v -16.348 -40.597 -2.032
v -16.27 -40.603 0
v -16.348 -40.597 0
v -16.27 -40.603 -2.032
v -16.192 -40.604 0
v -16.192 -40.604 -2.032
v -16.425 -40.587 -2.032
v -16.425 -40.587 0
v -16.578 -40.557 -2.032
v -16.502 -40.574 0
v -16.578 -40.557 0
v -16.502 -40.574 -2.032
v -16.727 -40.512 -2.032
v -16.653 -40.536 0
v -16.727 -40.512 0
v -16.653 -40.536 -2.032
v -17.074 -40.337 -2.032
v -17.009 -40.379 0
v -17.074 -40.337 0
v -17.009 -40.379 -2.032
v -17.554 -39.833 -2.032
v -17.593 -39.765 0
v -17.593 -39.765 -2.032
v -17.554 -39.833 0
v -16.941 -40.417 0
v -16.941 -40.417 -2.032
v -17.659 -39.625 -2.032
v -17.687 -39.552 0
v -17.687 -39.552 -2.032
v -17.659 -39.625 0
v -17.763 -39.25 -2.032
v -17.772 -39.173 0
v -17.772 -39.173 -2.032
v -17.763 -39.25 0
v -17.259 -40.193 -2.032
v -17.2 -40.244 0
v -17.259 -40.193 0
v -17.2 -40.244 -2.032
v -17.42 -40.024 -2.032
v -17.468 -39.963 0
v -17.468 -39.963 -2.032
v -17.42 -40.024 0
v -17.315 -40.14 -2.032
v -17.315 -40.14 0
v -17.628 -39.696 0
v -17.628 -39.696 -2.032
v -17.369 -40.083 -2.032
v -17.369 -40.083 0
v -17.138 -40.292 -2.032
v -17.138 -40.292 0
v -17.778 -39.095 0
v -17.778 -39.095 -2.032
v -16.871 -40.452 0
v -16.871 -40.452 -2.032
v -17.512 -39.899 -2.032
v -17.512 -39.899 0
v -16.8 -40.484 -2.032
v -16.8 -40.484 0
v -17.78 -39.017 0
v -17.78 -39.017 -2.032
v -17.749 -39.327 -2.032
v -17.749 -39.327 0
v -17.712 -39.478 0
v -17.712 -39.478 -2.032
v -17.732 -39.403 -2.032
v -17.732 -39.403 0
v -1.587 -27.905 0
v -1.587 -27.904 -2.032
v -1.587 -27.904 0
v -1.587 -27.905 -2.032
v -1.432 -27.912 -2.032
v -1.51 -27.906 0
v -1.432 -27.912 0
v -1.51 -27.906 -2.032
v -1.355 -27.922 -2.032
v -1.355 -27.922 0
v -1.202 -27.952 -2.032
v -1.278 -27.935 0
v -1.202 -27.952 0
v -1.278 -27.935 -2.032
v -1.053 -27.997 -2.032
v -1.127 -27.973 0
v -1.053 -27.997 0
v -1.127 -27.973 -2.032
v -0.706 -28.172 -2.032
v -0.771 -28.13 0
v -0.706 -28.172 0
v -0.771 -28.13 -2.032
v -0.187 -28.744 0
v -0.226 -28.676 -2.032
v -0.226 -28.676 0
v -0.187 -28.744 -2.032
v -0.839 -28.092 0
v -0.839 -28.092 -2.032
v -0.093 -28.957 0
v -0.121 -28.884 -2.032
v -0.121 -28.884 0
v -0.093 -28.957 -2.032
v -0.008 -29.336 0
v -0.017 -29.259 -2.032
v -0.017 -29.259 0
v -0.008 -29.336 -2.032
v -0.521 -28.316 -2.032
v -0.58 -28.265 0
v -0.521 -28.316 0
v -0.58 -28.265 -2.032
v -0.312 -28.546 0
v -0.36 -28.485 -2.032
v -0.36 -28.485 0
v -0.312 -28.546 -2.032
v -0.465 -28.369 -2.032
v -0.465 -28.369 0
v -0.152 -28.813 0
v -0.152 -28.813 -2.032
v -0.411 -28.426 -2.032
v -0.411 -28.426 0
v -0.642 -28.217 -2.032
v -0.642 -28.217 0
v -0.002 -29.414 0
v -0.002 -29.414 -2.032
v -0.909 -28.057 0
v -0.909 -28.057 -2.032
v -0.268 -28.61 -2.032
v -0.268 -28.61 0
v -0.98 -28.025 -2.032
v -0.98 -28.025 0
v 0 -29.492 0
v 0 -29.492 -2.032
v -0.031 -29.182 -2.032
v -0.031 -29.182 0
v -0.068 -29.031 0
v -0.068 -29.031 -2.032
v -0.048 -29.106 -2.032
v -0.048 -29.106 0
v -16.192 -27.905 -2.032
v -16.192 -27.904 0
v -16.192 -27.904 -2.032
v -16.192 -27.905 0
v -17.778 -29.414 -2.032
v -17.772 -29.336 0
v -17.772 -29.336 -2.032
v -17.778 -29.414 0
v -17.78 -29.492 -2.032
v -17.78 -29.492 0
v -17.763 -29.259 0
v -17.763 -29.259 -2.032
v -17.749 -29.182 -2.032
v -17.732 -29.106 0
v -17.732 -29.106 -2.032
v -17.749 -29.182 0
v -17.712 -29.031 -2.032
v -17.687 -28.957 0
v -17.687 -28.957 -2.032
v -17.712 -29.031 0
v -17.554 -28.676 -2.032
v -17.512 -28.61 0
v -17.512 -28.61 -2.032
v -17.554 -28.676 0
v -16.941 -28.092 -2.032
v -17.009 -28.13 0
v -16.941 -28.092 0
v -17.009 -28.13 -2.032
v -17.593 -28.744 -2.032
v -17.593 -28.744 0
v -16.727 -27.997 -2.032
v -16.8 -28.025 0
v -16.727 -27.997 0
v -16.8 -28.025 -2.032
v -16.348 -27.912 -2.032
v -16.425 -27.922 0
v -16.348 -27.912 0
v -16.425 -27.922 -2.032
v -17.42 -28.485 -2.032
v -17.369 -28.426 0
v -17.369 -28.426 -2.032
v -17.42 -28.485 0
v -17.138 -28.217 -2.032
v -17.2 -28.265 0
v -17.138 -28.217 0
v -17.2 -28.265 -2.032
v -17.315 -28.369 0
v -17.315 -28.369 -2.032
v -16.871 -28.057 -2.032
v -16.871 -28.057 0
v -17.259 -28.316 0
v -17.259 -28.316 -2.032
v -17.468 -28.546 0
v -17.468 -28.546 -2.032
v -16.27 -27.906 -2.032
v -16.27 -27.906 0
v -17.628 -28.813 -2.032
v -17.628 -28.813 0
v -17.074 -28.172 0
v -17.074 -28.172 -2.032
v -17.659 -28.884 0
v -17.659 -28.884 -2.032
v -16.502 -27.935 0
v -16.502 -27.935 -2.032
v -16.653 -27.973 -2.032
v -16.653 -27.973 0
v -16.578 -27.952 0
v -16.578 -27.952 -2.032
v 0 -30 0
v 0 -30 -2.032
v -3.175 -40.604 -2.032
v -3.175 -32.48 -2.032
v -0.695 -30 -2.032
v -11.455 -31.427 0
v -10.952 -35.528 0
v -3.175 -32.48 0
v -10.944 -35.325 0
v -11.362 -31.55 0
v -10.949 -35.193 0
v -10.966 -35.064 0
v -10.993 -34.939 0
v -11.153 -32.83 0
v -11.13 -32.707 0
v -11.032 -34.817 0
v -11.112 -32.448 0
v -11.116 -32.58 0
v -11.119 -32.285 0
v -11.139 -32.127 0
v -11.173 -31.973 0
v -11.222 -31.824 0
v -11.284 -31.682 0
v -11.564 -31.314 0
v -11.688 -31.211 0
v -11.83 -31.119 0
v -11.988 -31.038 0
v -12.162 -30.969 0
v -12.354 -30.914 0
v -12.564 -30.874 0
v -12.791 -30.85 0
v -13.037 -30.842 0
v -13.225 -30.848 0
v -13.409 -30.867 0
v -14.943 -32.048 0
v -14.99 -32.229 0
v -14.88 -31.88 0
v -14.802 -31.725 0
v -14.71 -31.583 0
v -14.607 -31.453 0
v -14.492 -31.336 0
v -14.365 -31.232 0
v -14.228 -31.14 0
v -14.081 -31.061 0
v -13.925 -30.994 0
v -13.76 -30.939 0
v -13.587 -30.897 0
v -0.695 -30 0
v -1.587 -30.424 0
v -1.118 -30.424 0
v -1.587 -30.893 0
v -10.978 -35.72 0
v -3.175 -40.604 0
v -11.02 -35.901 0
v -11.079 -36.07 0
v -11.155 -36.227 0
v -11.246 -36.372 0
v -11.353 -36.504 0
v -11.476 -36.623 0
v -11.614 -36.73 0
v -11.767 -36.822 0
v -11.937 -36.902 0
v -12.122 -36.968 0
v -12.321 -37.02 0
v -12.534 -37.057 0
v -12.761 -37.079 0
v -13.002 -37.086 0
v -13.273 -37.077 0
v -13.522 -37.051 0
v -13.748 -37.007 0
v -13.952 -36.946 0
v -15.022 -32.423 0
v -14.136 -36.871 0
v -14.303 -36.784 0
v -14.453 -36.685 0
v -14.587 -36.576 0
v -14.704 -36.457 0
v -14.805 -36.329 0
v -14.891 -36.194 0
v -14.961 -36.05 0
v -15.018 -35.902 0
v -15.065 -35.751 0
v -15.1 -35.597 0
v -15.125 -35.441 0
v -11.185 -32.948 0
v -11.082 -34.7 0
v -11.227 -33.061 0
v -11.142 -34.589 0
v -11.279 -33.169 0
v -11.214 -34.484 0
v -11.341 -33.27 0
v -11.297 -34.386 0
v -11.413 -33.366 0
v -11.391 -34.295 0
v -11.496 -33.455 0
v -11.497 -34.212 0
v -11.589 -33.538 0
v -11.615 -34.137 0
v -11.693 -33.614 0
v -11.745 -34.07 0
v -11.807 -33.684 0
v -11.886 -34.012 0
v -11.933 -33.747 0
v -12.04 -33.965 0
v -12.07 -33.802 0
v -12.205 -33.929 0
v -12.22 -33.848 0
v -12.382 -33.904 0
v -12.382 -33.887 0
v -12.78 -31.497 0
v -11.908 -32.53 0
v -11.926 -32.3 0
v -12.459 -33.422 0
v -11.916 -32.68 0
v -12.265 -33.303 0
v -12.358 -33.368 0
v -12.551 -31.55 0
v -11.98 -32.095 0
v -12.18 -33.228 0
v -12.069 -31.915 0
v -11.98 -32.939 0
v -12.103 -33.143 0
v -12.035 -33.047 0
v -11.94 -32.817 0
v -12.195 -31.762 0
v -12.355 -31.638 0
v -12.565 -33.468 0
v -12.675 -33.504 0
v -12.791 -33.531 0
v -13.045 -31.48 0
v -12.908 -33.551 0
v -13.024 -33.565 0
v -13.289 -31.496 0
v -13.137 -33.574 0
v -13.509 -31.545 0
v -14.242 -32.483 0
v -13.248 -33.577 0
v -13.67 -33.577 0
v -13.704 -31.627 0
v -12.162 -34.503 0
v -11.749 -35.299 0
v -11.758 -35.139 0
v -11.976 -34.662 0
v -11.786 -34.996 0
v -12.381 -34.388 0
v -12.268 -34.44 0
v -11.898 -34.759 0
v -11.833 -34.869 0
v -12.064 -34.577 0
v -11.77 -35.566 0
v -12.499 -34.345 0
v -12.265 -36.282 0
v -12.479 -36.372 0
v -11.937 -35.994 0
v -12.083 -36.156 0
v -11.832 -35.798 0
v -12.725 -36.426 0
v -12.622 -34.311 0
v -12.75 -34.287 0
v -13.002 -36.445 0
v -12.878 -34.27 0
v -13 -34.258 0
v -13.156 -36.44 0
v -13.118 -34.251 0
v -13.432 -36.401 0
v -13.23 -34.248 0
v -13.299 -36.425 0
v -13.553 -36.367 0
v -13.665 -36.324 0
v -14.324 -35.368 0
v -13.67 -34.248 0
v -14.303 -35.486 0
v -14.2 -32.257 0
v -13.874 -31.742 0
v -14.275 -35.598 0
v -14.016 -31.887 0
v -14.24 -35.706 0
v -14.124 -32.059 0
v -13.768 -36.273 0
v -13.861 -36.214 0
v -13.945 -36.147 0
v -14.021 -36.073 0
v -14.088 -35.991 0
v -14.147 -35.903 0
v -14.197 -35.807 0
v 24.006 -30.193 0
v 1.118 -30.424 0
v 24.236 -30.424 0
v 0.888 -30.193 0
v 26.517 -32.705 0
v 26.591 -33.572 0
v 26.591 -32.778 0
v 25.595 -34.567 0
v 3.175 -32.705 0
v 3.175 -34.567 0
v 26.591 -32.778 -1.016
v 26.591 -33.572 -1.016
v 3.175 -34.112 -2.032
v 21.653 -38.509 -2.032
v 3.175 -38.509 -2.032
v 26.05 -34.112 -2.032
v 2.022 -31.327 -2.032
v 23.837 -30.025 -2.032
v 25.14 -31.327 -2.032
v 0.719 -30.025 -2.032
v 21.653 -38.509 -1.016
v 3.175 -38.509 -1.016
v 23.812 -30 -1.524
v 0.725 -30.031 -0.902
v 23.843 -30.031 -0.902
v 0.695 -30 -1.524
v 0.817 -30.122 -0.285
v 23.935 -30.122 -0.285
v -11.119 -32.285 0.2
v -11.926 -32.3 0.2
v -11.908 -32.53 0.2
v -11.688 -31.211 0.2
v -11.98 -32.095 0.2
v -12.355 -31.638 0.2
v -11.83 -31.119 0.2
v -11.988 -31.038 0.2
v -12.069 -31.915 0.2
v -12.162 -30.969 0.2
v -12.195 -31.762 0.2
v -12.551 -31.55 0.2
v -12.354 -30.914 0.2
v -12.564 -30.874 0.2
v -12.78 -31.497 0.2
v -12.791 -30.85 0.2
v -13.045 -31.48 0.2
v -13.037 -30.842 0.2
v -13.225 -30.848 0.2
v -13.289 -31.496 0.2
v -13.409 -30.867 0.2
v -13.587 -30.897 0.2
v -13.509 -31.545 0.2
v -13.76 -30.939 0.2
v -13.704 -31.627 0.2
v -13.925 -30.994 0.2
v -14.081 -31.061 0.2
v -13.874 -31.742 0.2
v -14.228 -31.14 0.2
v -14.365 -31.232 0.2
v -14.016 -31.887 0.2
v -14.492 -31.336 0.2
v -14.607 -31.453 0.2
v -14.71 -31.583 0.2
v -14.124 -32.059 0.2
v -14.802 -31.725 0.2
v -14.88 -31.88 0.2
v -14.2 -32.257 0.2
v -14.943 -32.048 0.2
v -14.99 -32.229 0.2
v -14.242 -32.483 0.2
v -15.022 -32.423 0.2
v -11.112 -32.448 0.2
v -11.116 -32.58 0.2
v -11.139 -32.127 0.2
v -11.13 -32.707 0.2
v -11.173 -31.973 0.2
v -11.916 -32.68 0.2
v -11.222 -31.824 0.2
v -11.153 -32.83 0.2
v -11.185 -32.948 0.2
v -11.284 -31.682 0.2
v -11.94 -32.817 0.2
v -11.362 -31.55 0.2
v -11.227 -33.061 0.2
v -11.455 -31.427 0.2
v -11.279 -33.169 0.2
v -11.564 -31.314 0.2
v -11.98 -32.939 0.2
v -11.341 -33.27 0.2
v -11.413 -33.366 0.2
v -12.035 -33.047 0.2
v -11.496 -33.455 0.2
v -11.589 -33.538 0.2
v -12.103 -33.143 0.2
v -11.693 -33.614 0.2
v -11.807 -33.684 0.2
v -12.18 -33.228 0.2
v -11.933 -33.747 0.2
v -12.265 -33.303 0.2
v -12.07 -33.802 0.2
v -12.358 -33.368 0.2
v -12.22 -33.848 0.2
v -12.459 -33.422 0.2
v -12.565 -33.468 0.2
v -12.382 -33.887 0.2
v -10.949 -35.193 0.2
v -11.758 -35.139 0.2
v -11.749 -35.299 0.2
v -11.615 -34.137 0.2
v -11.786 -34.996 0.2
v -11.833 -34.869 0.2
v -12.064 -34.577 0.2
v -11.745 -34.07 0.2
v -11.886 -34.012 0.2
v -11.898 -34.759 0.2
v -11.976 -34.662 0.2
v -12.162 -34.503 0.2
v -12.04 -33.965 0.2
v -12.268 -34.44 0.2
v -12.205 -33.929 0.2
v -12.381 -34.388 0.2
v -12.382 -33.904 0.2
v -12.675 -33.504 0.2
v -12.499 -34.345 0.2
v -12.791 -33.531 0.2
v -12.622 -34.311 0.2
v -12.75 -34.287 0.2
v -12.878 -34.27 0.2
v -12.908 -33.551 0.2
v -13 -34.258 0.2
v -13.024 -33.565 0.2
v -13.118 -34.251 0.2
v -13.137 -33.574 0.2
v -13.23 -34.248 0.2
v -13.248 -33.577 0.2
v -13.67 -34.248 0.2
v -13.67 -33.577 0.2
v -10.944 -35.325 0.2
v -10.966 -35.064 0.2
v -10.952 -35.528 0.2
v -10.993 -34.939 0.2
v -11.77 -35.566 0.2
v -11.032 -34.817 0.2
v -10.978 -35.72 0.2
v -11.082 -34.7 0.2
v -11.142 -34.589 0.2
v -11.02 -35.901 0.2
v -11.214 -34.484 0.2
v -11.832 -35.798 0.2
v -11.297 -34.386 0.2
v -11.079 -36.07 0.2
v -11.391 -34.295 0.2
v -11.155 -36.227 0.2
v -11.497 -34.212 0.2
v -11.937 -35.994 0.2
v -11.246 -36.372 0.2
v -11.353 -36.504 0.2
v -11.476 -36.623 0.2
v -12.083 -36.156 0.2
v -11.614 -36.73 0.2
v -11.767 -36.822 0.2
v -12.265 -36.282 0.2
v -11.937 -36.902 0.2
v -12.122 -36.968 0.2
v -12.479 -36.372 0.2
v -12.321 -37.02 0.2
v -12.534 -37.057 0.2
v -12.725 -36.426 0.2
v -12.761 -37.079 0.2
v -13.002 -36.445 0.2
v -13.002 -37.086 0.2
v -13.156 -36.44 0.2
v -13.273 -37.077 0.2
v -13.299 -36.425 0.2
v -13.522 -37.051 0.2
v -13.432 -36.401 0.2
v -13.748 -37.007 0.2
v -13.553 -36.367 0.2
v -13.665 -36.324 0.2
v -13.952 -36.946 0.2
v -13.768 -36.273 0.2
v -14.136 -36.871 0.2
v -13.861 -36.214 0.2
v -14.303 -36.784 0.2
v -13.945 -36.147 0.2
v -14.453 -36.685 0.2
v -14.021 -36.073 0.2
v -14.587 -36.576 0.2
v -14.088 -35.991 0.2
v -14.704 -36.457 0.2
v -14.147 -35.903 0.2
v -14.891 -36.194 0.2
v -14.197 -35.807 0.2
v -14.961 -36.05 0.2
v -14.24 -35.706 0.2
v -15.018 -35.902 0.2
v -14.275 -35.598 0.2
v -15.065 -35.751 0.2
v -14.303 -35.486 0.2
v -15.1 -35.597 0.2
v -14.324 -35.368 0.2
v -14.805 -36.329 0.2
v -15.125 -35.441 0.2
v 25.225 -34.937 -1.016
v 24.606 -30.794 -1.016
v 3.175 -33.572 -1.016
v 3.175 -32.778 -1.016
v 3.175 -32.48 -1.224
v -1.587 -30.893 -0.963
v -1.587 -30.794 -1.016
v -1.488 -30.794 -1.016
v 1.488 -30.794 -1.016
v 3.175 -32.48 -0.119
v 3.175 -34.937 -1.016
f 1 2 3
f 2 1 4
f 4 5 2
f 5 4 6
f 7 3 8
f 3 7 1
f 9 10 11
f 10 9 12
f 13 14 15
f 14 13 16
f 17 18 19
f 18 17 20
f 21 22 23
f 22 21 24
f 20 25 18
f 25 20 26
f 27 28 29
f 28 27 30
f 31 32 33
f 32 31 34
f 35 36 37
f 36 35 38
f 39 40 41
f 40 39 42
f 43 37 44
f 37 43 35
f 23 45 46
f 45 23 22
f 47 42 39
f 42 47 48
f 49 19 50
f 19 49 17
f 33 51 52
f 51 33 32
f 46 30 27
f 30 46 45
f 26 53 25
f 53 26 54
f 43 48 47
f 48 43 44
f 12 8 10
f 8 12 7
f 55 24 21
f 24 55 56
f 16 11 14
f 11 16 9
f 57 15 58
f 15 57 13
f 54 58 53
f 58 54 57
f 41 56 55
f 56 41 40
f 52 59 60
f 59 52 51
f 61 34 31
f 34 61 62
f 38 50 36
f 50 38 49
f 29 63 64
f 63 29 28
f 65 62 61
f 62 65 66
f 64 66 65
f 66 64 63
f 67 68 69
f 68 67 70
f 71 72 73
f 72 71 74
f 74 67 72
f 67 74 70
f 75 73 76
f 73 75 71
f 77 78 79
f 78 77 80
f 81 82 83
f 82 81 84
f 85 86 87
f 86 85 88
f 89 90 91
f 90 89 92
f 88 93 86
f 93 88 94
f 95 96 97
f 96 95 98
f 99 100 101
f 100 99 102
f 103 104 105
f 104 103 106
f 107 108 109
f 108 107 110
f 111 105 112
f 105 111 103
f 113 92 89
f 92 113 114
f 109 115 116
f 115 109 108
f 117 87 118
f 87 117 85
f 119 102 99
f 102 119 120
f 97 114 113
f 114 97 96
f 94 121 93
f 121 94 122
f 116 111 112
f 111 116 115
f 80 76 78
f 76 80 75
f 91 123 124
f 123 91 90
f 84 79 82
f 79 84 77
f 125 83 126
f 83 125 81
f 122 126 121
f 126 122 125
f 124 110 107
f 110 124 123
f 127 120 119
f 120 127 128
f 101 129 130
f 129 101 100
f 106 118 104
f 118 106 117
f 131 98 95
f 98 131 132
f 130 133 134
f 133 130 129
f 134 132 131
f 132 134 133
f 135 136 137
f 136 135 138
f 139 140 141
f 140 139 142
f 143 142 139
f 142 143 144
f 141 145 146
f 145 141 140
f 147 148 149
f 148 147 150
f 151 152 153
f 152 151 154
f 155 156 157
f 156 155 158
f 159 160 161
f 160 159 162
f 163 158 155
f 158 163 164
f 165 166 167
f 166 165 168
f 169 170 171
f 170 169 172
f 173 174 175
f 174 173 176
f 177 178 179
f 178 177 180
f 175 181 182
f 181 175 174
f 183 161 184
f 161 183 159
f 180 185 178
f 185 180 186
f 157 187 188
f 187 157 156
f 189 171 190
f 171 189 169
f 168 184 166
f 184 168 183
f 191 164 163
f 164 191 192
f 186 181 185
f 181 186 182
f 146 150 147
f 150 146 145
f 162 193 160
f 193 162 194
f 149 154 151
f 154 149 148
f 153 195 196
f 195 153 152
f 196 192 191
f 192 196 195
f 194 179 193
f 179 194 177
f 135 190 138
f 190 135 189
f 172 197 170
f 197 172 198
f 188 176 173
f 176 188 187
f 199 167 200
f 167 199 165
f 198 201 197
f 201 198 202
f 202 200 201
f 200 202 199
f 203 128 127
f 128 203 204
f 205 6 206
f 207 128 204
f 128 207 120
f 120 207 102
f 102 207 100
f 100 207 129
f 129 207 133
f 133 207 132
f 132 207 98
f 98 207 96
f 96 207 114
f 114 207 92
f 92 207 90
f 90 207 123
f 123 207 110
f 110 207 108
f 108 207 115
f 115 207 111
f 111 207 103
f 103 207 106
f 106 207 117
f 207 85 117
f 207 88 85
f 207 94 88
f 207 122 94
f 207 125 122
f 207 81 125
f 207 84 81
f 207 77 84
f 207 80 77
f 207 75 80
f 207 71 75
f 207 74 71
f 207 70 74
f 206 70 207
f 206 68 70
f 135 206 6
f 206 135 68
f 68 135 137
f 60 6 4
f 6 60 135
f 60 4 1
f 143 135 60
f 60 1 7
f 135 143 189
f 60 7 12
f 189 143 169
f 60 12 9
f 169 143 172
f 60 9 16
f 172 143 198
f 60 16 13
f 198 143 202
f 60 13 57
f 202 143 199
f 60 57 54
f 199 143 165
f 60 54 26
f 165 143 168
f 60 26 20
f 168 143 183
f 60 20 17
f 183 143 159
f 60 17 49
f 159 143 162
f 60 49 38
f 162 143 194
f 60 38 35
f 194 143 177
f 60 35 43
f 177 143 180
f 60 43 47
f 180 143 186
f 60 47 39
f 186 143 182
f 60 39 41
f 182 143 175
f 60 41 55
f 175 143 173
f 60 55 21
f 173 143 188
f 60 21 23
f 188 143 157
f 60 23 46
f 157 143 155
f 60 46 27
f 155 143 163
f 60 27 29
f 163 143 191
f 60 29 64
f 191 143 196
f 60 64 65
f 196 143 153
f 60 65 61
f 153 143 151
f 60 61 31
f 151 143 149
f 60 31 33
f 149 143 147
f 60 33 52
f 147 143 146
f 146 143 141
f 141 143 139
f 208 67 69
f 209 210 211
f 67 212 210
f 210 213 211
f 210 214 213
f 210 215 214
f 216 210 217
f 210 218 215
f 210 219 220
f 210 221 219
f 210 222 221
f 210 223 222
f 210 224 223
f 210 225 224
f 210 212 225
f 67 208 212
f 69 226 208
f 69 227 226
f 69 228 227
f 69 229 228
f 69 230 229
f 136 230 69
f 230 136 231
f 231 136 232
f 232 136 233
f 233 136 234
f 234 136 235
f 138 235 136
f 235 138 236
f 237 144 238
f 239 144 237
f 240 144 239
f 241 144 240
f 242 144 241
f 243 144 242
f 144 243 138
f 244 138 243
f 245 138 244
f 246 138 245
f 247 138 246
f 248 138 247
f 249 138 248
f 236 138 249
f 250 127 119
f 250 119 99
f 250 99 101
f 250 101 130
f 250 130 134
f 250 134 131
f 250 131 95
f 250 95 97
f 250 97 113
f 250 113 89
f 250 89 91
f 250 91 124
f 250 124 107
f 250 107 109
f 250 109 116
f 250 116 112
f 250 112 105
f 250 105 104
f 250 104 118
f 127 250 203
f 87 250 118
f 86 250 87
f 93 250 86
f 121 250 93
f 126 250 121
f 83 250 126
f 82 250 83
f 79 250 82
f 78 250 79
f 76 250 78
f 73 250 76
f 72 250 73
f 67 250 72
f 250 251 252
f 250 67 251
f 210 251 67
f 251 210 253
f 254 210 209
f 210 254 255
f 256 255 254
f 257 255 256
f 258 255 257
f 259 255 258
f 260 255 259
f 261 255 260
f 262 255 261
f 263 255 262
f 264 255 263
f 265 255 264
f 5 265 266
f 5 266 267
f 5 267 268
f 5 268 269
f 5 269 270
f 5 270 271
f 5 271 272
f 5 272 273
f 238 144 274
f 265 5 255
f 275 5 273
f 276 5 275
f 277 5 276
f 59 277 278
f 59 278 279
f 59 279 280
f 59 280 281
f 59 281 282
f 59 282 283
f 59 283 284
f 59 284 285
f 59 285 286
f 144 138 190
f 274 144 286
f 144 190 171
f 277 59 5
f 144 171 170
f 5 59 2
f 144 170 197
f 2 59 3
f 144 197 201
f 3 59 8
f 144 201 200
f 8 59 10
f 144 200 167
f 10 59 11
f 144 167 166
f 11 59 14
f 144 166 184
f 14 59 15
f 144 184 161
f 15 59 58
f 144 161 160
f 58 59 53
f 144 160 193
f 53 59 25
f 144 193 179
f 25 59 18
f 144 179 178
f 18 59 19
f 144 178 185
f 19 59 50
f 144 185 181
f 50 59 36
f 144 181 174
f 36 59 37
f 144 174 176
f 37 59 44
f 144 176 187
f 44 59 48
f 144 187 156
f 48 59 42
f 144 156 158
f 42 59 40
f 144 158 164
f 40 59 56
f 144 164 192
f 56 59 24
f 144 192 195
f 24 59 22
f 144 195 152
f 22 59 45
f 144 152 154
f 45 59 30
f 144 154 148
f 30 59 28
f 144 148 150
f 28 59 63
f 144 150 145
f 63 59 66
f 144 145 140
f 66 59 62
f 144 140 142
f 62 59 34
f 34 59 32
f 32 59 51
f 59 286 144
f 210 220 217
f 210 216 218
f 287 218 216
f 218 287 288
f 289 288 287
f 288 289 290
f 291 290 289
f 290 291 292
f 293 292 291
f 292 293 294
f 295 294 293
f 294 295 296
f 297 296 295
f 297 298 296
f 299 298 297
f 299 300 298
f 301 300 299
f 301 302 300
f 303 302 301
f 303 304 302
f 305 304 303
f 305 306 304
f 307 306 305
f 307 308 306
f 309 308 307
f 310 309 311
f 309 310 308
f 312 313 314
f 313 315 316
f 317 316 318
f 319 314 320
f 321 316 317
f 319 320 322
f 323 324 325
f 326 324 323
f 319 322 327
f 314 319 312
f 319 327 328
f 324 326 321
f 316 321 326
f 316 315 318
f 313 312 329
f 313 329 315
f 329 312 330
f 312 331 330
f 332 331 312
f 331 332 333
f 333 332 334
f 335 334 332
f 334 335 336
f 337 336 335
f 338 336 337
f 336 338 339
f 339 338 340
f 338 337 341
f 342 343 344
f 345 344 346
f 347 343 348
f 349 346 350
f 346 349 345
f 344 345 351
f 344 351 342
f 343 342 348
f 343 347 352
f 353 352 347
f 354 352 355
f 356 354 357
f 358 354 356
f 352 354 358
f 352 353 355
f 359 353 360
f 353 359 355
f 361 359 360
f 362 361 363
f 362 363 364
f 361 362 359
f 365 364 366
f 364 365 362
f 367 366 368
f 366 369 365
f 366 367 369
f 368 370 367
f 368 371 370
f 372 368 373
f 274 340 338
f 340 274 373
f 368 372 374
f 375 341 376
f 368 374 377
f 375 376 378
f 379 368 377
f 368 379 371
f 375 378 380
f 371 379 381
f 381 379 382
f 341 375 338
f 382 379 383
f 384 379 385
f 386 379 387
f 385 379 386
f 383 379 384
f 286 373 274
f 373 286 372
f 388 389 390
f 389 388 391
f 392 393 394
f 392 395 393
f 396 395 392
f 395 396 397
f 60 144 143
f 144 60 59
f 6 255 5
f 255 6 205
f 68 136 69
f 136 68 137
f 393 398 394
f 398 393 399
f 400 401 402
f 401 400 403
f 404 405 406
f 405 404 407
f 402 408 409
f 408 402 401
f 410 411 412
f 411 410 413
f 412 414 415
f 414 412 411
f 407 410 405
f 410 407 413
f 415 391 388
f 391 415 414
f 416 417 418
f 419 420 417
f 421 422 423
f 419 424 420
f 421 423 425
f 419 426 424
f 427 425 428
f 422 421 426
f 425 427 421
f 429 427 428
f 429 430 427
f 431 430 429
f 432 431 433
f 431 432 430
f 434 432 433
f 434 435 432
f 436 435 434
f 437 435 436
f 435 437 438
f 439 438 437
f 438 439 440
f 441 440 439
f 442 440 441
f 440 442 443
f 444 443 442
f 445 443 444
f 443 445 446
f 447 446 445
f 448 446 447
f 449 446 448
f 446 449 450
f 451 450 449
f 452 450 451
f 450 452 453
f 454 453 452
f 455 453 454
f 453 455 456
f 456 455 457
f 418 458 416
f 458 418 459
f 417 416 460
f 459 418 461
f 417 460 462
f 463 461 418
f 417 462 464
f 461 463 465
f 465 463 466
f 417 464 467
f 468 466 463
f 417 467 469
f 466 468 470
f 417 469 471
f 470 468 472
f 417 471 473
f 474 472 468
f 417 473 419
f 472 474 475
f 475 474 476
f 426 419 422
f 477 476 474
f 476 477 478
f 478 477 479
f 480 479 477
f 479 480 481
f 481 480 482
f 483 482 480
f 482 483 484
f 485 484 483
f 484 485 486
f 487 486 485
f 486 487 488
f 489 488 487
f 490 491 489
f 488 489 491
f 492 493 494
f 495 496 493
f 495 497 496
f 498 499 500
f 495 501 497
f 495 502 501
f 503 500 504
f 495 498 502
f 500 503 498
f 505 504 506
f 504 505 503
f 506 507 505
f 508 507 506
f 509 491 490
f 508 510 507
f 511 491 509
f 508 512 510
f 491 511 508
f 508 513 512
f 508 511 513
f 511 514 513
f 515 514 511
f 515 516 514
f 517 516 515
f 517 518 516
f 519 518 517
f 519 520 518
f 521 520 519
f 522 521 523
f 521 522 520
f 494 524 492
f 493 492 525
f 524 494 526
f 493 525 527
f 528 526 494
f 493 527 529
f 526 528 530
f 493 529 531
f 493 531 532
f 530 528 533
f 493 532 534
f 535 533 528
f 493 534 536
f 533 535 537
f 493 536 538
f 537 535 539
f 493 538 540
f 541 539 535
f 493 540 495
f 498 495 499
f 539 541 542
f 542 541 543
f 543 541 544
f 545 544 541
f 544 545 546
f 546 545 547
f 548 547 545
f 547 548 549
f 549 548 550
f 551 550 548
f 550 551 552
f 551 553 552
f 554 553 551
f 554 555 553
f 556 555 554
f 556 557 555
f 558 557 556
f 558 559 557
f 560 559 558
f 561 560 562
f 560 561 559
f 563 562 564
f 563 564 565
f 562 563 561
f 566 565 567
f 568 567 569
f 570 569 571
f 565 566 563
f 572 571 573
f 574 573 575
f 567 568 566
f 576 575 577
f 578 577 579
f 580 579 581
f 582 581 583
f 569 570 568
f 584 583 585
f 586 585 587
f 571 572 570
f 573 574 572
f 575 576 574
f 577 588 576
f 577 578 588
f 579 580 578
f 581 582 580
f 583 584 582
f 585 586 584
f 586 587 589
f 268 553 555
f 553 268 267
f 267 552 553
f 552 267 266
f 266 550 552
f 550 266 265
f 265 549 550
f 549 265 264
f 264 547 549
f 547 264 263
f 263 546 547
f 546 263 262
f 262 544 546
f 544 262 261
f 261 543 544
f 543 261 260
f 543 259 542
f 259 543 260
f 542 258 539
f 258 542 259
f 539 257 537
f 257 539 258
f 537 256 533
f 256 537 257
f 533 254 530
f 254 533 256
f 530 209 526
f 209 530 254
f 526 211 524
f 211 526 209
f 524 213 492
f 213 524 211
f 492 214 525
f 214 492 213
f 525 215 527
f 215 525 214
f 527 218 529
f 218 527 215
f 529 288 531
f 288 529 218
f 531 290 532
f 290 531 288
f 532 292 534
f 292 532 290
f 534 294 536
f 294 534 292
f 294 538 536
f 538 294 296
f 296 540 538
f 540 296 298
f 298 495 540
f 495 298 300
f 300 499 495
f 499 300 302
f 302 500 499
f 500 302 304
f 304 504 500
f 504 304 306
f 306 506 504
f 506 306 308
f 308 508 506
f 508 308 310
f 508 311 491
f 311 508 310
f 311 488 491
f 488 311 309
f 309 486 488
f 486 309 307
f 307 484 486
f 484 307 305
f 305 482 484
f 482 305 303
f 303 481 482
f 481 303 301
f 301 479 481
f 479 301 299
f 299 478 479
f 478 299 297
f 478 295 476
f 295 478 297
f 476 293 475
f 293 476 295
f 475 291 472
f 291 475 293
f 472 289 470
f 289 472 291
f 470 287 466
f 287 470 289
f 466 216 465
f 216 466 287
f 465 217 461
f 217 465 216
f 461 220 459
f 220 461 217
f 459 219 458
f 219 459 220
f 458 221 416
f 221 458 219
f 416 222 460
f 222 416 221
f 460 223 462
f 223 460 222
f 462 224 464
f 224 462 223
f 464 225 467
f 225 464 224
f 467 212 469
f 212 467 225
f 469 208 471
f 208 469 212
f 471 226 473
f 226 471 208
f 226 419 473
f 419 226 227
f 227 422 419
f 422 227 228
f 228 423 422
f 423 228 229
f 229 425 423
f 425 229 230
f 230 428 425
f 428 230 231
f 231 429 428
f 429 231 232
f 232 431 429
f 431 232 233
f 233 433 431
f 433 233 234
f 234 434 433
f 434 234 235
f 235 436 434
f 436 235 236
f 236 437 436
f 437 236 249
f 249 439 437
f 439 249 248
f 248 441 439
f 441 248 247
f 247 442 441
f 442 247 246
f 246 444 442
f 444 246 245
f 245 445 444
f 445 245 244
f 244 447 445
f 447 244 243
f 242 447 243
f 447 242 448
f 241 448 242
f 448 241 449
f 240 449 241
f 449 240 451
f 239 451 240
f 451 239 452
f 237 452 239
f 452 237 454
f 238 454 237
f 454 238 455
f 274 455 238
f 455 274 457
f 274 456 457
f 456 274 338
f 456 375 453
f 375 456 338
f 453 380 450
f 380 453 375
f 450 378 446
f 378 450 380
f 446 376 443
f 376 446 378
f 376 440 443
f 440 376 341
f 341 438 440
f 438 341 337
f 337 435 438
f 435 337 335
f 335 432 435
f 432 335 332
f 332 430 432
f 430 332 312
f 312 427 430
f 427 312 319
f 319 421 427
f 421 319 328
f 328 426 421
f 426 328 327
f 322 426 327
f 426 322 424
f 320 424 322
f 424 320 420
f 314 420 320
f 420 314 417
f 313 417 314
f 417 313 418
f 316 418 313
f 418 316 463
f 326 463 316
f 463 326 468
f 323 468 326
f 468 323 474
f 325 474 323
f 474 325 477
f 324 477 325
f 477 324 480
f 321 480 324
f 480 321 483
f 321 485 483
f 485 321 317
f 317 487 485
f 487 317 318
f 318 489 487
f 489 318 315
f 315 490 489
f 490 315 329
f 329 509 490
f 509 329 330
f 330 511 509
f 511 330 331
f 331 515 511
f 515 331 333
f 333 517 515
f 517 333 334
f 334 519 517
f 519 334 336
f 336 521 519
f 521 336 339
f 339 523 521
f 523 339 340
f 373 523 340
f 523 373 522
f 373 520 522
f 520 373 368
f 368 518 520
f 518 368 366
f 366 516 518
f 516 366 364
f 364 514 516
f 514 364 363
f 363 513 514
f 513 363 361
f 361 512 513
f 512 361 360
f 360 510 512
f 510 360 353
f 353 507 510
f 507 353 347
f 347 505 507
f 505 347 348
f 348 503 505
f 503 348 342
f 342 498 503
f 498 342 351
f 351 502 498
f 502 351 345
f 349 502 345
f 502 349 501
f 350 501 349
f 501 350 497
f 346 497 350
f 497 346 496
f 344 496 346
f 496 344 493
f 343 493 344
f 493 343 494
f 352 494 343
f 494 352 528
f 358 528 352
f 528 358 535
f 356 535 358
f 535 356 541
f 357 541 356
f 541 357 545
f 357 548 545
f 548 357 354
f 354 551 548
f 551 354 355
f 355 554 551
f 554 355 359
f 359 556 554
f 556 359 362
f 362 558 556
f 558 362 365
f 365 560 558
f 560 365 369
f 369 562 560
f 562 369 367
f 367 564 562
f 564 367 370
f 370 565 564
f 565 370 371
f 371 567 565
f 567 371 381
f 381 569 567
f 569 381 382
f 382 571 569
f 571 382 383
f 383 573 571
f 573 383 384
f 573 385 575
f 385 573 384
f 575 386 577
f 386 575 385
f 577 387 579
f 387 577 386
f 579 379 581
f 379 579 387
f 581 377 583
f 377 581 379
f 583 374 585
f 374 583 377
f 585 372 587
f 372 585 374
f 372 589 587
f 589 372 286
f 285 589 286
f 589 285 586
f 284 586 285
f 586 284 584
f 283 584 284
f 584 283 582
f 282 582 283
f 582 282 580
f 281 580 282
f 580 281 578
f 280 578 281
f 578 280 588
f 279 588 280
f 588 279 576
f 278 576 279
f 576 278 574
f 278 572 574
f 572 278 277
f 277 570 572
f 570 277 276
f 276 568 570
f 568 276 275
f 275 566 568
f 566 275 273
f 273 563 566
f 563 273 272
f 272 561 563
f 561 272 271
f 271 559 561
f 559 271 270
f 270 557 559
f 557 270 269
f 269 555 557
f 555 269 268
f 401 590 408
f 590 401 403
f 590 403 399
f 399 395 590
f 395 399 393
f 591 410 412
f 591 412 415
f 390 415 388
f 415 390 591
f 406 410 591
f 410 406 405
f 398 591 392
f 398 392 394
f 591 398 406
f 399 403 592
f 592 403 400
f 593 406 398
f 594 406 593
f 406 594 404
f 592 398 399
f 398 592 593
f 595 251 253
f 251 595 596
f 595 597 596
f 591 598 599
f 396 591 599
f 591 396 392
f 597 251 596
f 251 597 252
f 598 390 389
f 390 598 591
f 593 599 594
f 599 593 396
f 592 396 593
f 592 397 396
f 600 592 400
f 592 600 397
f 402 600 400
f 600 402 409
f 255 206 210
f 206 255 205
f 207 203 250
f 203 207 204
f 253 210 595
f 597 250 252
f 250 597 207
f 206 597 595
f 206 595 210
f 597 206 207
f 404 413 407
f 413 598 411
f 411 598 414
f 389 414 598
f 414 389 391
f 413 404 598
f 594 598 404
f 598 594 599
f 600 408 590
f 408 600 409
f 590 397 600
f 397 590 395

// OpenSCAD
// Physical Keygen - by Nirav Patel <http://eclecti.cc>
//
// Generate a duplicate of a Schlage SC1 key by editing the last line of the file
// and entering in the key code of the lock.  If you don't know the key code,
// you can measure the key and compare the numbers at:
// http://web.archive.org/web/20050217020917fw_/http://dlaco.com/spacing/tips.htm
//
// This work is licensed under a Creative Commons Attribution 3.0 Unported License.

// Since the keys and locks I have were all designed in imperial units, the
// constants in this file will be defined in inches.  The mm function
// allows us to retain the proper size for exporting a metric STL.
function mm(i) = i*25.4;

// Higher definition curves
$fs = 0.01;

module roundedCube(dim, r=1, x=false, y=false, z=true, xcorners=[true,true,true,true], ycorners=[true,true,true,true], zcorners=[true,true,true,true], $fn=128)
{
	difference()
	{
		cube(dim);

		if(z)
		{
			translate([0, 0, -0.1])
			{
				if(zcorners[0])
					translate([0, dim[1]-r]) { rotateAround([0, 0, 90], [r/2, r/2, 0]) { meniscus(h=dim[2], r=r, fn=$fn); } }
				if(zcorners[1])
					translate([dim[0]-r, dim[1]-r]) { meniscus(h=dim[2], r=r, fn=$fn); }
				if(zcorners[2])
					translate([dim[0]-r, 0]) { rotateAround([0, 0, -90], [r/2, r/2, 0]) { meniscus(h=dim[2], r=r, fn=$fn); } }
				if(zcorners[3])
					rotateAround([0, 0, -180], [r/2, r/2, 0]) { meniscus(h=dim[2], r=r, fn=$fn); }
			}
		}

		if(y)
		{
			translate([0, -0.1, 0])
			{
				if(ycorners[0])
					translate([0, 0, dim[2]-r]) { rotateAround([0, 180, 0], [r/2, 0, r/2]) { rotateAround([-90, 0, 0], [0, r/2, r/2]) { meniscus(h=dim[1], r=r); } } }
				if(ycorners[1])
					translate([dim[0]-r, 0, dim[2]-r]) { rotateAround([0, -90, 0], [r/2, 0, r/2]) { rotateAround([-90, 0, 0], [0, r/2, r/2]) { meniscus(h=dim[1], r=r); } } }
				if(ycorners[2])
					translate([dim[0]-r, 0]) { rotateAround([-90, 0, 0], [0, r/2, r/2]) { meniscus(h=dim[1], r=r); } }
				if(ycorners[3])
					rotateAround([0, 90, 0], [r/2, 0, r/2]) { rotateAround([-90, 0, 0], [0, r/2, r/2]) { meniscus(h=dim[1], r=r); } }
			}
		}

		if(x)
		{
			translate([-0.1, 0, 0])
			{
				if(xcorners[0])
					translate([0, dim[1]-r]) { rotateAround([0, 90, 0], [r/2, 0, r/2]) { meniscus(h=dim[1], r=r); } }
				if(xcorners[1])
					translate([0, dim[1]-r, dim[2]-r]) { rotateAround([90, 0, 0], [0, r/2, r/2]) { rotateAround([0, 90, 0], [r/2, 0, r/2]) { meniscus(h=dim[1], r=r); } } }
				if(xcorners[2])
					translate([0, 0, dim[2]-r]) { rotateAround([180, 0, 0], [0, r/2, r/2]) { rotateAround([0, 90, 0], [r/2, 0, r/2]) { meniscus(h=dim[1], r=r); } } }
				if(xcorners[3])
					rotateAround([-90, 0, 0], [0, r/2, r/2]) { rotateAround([0, 90, 0], [r/2, 0, r/2]) { meniscus(h=dim[1], r=r); } }
			}
		}
	}
}

module meniscus(h, r, fn=128)
{
	$fn=fn;

	difference()
	{
		cube([r+0.2, r+0.2, h+0.2]);
		translate([0, 0, -0.1]) { cylinder(h=h+0.4, r=r); }
	}
}

module rotateAround(a, v) { translate(v) { rotate(a) { translate(-v) { children(); } } } }
module rounded(size, r) {
    union() {
        translate([r, 0, 0]) cube([size[0]-2*r, size[1], size[2]]);
        translate([0, r, 0]) cube([size[0], size[1]-2*r, size[2]]);
        translate([r, r, 0]) cylinder(h=size[2], r=r);
        translate([size[0]-r, r, 0]) cylinder(h=size[2], r=r);
        translate([r, size[1]-r, 0]) cylinder(h=size[2], r=r);
        translate([size[0]-r, size[1]-r, 0]) cylinder(h=size[2], r=r);
    }
}

module bit() {
    w = mm(1/4);
    difference() {
        translate([-w/2, 0, 0]) cube([w, mm(1), w]);
        translate([-mm(7/256), 0, 0]) rotate([0, 0, 135]) cube([w, w, w]);
         translate([mm(7/256), 0, 0]) rotate([0, 0, -45]) cube([w, w, w]);
    }
}

// Schlage SC1 5 pin key.  The measurements are mostly guesses based on reverse
// engineering some keys I have and some publicly available information.
module sc1(bits, id) {
    
    // You may need to adjust these to fit your specific printer settings
    thickness = mm(0.080);
    length = mm(17/16);
    width = mm(.335);
    
    shoulder = mm(.231);
    pin_spacing = mm(.156);
    depth_inc = mm(.015);
    
    // A fudge factor.  Printing with your average RepRap, the bottom layer is
    // going to be squeezed larger than you want. You can make the pins
    // go slighly deeper by a fudge amount to make up for it if you aren't
    // adjusting for it elsewhere like Skeinforge or in your firmware.
    // 0.5mm works well for me.
    fudge = 0.5;
    
    // Handle size
    h_l = mm(0.7);
    h_w = mm(0.5);
    h_d = mm(1/16);
    difference() {
        // blade and key handle
        union() {
            //roundedCube(dim, r=1, x=false, y=false, z=true, xcorners=[true,true,true,true], ycorners=[true,true,true,true], zcorners=[true,true,true,true], $fn=128)
            translate([-h_l, -h_w/2 + width/2, 0]) roundedCube([h_l, h_w, thickness], mm(1/16));
            
              // add text
    rotate([180,0,0]) translate([-h_l/1.15, -7, 0]) linear_extrude(0.2) text(str(id), mm(4/16));

            intersection() {
                // cut a little off the tip to avoid going too long
                cube([length - mm(1/64), width, thickness]);
                translate([0, mm(1/4), thickness*3/4]) rotate([0, 90, 0]) cylinder(h=length, r=mm(1/4), $fn=64);
            }
        }
        
        // chamfer the tip
        translate([length, mm(1/8), 0]) {
            rotate([0, 0, 45]) cube([10, 10, thickness]);
            rotate([0, 0, 225]) cube([10, 10, thickness]);
        }
        
        // put in a hole for keychain use
      //  translate([-h_l + mm(3/16), width/2, 0]) cylinder(h=thickness, r=mm(1/8));
        
        // cut the channels in the key.  designed more for printability than accuracy
        union() {
            translate([-h_d, mm(9/64), thickness/2]) rotate([62, 0, 0]) cube([length + h_d, width, width]);
            translate([-h_d, mm(7/64), thickness/2]) rotate([55, 0, 0]) cube([length + h_d, width, width]);
            translate([-h_d, mm(7/64), thickness/2]) cube([length + h_d, mm(1/32), width]);
        }
        
        translate([-h_d, width - mm(9/64), 0]) cube([length + h_d, width - (width - mm(10/64)), thickness/2]);
        translate([-h_d, width - mm(9/64), thickness/2]) rotate([-110, 0, 0]) cube([length + h_d, width, thickness/2]);
        
        intersection() {
            translate([-h_d, mm(1/32), thickness/2]) rotate([-118, 0, 0]) cube([length + h_d, width, width]);
            translate([-h_d, mm(1/32), thickness/2]) rotate([-110, 0, 0]) cube([length + h_d, width, width]);
        }
        
        // Do the actual bitting
        for (b = [0:4]) {
            translate([shoulder + b*pin_spacing, width - bits[b]*depth_inc - fudge, 0]) bit();
        }
    }
  
}

// This sample key goes to a lock that is sitting disassembled on my desk
// Flip the key over for easy printing
keysize = 55;
keywidth = 20;

// The "Original key"
translate([0,-30,0]) rotate([180, 0, 0]) sc1(3, 3, 1, 7, 2,"O");
